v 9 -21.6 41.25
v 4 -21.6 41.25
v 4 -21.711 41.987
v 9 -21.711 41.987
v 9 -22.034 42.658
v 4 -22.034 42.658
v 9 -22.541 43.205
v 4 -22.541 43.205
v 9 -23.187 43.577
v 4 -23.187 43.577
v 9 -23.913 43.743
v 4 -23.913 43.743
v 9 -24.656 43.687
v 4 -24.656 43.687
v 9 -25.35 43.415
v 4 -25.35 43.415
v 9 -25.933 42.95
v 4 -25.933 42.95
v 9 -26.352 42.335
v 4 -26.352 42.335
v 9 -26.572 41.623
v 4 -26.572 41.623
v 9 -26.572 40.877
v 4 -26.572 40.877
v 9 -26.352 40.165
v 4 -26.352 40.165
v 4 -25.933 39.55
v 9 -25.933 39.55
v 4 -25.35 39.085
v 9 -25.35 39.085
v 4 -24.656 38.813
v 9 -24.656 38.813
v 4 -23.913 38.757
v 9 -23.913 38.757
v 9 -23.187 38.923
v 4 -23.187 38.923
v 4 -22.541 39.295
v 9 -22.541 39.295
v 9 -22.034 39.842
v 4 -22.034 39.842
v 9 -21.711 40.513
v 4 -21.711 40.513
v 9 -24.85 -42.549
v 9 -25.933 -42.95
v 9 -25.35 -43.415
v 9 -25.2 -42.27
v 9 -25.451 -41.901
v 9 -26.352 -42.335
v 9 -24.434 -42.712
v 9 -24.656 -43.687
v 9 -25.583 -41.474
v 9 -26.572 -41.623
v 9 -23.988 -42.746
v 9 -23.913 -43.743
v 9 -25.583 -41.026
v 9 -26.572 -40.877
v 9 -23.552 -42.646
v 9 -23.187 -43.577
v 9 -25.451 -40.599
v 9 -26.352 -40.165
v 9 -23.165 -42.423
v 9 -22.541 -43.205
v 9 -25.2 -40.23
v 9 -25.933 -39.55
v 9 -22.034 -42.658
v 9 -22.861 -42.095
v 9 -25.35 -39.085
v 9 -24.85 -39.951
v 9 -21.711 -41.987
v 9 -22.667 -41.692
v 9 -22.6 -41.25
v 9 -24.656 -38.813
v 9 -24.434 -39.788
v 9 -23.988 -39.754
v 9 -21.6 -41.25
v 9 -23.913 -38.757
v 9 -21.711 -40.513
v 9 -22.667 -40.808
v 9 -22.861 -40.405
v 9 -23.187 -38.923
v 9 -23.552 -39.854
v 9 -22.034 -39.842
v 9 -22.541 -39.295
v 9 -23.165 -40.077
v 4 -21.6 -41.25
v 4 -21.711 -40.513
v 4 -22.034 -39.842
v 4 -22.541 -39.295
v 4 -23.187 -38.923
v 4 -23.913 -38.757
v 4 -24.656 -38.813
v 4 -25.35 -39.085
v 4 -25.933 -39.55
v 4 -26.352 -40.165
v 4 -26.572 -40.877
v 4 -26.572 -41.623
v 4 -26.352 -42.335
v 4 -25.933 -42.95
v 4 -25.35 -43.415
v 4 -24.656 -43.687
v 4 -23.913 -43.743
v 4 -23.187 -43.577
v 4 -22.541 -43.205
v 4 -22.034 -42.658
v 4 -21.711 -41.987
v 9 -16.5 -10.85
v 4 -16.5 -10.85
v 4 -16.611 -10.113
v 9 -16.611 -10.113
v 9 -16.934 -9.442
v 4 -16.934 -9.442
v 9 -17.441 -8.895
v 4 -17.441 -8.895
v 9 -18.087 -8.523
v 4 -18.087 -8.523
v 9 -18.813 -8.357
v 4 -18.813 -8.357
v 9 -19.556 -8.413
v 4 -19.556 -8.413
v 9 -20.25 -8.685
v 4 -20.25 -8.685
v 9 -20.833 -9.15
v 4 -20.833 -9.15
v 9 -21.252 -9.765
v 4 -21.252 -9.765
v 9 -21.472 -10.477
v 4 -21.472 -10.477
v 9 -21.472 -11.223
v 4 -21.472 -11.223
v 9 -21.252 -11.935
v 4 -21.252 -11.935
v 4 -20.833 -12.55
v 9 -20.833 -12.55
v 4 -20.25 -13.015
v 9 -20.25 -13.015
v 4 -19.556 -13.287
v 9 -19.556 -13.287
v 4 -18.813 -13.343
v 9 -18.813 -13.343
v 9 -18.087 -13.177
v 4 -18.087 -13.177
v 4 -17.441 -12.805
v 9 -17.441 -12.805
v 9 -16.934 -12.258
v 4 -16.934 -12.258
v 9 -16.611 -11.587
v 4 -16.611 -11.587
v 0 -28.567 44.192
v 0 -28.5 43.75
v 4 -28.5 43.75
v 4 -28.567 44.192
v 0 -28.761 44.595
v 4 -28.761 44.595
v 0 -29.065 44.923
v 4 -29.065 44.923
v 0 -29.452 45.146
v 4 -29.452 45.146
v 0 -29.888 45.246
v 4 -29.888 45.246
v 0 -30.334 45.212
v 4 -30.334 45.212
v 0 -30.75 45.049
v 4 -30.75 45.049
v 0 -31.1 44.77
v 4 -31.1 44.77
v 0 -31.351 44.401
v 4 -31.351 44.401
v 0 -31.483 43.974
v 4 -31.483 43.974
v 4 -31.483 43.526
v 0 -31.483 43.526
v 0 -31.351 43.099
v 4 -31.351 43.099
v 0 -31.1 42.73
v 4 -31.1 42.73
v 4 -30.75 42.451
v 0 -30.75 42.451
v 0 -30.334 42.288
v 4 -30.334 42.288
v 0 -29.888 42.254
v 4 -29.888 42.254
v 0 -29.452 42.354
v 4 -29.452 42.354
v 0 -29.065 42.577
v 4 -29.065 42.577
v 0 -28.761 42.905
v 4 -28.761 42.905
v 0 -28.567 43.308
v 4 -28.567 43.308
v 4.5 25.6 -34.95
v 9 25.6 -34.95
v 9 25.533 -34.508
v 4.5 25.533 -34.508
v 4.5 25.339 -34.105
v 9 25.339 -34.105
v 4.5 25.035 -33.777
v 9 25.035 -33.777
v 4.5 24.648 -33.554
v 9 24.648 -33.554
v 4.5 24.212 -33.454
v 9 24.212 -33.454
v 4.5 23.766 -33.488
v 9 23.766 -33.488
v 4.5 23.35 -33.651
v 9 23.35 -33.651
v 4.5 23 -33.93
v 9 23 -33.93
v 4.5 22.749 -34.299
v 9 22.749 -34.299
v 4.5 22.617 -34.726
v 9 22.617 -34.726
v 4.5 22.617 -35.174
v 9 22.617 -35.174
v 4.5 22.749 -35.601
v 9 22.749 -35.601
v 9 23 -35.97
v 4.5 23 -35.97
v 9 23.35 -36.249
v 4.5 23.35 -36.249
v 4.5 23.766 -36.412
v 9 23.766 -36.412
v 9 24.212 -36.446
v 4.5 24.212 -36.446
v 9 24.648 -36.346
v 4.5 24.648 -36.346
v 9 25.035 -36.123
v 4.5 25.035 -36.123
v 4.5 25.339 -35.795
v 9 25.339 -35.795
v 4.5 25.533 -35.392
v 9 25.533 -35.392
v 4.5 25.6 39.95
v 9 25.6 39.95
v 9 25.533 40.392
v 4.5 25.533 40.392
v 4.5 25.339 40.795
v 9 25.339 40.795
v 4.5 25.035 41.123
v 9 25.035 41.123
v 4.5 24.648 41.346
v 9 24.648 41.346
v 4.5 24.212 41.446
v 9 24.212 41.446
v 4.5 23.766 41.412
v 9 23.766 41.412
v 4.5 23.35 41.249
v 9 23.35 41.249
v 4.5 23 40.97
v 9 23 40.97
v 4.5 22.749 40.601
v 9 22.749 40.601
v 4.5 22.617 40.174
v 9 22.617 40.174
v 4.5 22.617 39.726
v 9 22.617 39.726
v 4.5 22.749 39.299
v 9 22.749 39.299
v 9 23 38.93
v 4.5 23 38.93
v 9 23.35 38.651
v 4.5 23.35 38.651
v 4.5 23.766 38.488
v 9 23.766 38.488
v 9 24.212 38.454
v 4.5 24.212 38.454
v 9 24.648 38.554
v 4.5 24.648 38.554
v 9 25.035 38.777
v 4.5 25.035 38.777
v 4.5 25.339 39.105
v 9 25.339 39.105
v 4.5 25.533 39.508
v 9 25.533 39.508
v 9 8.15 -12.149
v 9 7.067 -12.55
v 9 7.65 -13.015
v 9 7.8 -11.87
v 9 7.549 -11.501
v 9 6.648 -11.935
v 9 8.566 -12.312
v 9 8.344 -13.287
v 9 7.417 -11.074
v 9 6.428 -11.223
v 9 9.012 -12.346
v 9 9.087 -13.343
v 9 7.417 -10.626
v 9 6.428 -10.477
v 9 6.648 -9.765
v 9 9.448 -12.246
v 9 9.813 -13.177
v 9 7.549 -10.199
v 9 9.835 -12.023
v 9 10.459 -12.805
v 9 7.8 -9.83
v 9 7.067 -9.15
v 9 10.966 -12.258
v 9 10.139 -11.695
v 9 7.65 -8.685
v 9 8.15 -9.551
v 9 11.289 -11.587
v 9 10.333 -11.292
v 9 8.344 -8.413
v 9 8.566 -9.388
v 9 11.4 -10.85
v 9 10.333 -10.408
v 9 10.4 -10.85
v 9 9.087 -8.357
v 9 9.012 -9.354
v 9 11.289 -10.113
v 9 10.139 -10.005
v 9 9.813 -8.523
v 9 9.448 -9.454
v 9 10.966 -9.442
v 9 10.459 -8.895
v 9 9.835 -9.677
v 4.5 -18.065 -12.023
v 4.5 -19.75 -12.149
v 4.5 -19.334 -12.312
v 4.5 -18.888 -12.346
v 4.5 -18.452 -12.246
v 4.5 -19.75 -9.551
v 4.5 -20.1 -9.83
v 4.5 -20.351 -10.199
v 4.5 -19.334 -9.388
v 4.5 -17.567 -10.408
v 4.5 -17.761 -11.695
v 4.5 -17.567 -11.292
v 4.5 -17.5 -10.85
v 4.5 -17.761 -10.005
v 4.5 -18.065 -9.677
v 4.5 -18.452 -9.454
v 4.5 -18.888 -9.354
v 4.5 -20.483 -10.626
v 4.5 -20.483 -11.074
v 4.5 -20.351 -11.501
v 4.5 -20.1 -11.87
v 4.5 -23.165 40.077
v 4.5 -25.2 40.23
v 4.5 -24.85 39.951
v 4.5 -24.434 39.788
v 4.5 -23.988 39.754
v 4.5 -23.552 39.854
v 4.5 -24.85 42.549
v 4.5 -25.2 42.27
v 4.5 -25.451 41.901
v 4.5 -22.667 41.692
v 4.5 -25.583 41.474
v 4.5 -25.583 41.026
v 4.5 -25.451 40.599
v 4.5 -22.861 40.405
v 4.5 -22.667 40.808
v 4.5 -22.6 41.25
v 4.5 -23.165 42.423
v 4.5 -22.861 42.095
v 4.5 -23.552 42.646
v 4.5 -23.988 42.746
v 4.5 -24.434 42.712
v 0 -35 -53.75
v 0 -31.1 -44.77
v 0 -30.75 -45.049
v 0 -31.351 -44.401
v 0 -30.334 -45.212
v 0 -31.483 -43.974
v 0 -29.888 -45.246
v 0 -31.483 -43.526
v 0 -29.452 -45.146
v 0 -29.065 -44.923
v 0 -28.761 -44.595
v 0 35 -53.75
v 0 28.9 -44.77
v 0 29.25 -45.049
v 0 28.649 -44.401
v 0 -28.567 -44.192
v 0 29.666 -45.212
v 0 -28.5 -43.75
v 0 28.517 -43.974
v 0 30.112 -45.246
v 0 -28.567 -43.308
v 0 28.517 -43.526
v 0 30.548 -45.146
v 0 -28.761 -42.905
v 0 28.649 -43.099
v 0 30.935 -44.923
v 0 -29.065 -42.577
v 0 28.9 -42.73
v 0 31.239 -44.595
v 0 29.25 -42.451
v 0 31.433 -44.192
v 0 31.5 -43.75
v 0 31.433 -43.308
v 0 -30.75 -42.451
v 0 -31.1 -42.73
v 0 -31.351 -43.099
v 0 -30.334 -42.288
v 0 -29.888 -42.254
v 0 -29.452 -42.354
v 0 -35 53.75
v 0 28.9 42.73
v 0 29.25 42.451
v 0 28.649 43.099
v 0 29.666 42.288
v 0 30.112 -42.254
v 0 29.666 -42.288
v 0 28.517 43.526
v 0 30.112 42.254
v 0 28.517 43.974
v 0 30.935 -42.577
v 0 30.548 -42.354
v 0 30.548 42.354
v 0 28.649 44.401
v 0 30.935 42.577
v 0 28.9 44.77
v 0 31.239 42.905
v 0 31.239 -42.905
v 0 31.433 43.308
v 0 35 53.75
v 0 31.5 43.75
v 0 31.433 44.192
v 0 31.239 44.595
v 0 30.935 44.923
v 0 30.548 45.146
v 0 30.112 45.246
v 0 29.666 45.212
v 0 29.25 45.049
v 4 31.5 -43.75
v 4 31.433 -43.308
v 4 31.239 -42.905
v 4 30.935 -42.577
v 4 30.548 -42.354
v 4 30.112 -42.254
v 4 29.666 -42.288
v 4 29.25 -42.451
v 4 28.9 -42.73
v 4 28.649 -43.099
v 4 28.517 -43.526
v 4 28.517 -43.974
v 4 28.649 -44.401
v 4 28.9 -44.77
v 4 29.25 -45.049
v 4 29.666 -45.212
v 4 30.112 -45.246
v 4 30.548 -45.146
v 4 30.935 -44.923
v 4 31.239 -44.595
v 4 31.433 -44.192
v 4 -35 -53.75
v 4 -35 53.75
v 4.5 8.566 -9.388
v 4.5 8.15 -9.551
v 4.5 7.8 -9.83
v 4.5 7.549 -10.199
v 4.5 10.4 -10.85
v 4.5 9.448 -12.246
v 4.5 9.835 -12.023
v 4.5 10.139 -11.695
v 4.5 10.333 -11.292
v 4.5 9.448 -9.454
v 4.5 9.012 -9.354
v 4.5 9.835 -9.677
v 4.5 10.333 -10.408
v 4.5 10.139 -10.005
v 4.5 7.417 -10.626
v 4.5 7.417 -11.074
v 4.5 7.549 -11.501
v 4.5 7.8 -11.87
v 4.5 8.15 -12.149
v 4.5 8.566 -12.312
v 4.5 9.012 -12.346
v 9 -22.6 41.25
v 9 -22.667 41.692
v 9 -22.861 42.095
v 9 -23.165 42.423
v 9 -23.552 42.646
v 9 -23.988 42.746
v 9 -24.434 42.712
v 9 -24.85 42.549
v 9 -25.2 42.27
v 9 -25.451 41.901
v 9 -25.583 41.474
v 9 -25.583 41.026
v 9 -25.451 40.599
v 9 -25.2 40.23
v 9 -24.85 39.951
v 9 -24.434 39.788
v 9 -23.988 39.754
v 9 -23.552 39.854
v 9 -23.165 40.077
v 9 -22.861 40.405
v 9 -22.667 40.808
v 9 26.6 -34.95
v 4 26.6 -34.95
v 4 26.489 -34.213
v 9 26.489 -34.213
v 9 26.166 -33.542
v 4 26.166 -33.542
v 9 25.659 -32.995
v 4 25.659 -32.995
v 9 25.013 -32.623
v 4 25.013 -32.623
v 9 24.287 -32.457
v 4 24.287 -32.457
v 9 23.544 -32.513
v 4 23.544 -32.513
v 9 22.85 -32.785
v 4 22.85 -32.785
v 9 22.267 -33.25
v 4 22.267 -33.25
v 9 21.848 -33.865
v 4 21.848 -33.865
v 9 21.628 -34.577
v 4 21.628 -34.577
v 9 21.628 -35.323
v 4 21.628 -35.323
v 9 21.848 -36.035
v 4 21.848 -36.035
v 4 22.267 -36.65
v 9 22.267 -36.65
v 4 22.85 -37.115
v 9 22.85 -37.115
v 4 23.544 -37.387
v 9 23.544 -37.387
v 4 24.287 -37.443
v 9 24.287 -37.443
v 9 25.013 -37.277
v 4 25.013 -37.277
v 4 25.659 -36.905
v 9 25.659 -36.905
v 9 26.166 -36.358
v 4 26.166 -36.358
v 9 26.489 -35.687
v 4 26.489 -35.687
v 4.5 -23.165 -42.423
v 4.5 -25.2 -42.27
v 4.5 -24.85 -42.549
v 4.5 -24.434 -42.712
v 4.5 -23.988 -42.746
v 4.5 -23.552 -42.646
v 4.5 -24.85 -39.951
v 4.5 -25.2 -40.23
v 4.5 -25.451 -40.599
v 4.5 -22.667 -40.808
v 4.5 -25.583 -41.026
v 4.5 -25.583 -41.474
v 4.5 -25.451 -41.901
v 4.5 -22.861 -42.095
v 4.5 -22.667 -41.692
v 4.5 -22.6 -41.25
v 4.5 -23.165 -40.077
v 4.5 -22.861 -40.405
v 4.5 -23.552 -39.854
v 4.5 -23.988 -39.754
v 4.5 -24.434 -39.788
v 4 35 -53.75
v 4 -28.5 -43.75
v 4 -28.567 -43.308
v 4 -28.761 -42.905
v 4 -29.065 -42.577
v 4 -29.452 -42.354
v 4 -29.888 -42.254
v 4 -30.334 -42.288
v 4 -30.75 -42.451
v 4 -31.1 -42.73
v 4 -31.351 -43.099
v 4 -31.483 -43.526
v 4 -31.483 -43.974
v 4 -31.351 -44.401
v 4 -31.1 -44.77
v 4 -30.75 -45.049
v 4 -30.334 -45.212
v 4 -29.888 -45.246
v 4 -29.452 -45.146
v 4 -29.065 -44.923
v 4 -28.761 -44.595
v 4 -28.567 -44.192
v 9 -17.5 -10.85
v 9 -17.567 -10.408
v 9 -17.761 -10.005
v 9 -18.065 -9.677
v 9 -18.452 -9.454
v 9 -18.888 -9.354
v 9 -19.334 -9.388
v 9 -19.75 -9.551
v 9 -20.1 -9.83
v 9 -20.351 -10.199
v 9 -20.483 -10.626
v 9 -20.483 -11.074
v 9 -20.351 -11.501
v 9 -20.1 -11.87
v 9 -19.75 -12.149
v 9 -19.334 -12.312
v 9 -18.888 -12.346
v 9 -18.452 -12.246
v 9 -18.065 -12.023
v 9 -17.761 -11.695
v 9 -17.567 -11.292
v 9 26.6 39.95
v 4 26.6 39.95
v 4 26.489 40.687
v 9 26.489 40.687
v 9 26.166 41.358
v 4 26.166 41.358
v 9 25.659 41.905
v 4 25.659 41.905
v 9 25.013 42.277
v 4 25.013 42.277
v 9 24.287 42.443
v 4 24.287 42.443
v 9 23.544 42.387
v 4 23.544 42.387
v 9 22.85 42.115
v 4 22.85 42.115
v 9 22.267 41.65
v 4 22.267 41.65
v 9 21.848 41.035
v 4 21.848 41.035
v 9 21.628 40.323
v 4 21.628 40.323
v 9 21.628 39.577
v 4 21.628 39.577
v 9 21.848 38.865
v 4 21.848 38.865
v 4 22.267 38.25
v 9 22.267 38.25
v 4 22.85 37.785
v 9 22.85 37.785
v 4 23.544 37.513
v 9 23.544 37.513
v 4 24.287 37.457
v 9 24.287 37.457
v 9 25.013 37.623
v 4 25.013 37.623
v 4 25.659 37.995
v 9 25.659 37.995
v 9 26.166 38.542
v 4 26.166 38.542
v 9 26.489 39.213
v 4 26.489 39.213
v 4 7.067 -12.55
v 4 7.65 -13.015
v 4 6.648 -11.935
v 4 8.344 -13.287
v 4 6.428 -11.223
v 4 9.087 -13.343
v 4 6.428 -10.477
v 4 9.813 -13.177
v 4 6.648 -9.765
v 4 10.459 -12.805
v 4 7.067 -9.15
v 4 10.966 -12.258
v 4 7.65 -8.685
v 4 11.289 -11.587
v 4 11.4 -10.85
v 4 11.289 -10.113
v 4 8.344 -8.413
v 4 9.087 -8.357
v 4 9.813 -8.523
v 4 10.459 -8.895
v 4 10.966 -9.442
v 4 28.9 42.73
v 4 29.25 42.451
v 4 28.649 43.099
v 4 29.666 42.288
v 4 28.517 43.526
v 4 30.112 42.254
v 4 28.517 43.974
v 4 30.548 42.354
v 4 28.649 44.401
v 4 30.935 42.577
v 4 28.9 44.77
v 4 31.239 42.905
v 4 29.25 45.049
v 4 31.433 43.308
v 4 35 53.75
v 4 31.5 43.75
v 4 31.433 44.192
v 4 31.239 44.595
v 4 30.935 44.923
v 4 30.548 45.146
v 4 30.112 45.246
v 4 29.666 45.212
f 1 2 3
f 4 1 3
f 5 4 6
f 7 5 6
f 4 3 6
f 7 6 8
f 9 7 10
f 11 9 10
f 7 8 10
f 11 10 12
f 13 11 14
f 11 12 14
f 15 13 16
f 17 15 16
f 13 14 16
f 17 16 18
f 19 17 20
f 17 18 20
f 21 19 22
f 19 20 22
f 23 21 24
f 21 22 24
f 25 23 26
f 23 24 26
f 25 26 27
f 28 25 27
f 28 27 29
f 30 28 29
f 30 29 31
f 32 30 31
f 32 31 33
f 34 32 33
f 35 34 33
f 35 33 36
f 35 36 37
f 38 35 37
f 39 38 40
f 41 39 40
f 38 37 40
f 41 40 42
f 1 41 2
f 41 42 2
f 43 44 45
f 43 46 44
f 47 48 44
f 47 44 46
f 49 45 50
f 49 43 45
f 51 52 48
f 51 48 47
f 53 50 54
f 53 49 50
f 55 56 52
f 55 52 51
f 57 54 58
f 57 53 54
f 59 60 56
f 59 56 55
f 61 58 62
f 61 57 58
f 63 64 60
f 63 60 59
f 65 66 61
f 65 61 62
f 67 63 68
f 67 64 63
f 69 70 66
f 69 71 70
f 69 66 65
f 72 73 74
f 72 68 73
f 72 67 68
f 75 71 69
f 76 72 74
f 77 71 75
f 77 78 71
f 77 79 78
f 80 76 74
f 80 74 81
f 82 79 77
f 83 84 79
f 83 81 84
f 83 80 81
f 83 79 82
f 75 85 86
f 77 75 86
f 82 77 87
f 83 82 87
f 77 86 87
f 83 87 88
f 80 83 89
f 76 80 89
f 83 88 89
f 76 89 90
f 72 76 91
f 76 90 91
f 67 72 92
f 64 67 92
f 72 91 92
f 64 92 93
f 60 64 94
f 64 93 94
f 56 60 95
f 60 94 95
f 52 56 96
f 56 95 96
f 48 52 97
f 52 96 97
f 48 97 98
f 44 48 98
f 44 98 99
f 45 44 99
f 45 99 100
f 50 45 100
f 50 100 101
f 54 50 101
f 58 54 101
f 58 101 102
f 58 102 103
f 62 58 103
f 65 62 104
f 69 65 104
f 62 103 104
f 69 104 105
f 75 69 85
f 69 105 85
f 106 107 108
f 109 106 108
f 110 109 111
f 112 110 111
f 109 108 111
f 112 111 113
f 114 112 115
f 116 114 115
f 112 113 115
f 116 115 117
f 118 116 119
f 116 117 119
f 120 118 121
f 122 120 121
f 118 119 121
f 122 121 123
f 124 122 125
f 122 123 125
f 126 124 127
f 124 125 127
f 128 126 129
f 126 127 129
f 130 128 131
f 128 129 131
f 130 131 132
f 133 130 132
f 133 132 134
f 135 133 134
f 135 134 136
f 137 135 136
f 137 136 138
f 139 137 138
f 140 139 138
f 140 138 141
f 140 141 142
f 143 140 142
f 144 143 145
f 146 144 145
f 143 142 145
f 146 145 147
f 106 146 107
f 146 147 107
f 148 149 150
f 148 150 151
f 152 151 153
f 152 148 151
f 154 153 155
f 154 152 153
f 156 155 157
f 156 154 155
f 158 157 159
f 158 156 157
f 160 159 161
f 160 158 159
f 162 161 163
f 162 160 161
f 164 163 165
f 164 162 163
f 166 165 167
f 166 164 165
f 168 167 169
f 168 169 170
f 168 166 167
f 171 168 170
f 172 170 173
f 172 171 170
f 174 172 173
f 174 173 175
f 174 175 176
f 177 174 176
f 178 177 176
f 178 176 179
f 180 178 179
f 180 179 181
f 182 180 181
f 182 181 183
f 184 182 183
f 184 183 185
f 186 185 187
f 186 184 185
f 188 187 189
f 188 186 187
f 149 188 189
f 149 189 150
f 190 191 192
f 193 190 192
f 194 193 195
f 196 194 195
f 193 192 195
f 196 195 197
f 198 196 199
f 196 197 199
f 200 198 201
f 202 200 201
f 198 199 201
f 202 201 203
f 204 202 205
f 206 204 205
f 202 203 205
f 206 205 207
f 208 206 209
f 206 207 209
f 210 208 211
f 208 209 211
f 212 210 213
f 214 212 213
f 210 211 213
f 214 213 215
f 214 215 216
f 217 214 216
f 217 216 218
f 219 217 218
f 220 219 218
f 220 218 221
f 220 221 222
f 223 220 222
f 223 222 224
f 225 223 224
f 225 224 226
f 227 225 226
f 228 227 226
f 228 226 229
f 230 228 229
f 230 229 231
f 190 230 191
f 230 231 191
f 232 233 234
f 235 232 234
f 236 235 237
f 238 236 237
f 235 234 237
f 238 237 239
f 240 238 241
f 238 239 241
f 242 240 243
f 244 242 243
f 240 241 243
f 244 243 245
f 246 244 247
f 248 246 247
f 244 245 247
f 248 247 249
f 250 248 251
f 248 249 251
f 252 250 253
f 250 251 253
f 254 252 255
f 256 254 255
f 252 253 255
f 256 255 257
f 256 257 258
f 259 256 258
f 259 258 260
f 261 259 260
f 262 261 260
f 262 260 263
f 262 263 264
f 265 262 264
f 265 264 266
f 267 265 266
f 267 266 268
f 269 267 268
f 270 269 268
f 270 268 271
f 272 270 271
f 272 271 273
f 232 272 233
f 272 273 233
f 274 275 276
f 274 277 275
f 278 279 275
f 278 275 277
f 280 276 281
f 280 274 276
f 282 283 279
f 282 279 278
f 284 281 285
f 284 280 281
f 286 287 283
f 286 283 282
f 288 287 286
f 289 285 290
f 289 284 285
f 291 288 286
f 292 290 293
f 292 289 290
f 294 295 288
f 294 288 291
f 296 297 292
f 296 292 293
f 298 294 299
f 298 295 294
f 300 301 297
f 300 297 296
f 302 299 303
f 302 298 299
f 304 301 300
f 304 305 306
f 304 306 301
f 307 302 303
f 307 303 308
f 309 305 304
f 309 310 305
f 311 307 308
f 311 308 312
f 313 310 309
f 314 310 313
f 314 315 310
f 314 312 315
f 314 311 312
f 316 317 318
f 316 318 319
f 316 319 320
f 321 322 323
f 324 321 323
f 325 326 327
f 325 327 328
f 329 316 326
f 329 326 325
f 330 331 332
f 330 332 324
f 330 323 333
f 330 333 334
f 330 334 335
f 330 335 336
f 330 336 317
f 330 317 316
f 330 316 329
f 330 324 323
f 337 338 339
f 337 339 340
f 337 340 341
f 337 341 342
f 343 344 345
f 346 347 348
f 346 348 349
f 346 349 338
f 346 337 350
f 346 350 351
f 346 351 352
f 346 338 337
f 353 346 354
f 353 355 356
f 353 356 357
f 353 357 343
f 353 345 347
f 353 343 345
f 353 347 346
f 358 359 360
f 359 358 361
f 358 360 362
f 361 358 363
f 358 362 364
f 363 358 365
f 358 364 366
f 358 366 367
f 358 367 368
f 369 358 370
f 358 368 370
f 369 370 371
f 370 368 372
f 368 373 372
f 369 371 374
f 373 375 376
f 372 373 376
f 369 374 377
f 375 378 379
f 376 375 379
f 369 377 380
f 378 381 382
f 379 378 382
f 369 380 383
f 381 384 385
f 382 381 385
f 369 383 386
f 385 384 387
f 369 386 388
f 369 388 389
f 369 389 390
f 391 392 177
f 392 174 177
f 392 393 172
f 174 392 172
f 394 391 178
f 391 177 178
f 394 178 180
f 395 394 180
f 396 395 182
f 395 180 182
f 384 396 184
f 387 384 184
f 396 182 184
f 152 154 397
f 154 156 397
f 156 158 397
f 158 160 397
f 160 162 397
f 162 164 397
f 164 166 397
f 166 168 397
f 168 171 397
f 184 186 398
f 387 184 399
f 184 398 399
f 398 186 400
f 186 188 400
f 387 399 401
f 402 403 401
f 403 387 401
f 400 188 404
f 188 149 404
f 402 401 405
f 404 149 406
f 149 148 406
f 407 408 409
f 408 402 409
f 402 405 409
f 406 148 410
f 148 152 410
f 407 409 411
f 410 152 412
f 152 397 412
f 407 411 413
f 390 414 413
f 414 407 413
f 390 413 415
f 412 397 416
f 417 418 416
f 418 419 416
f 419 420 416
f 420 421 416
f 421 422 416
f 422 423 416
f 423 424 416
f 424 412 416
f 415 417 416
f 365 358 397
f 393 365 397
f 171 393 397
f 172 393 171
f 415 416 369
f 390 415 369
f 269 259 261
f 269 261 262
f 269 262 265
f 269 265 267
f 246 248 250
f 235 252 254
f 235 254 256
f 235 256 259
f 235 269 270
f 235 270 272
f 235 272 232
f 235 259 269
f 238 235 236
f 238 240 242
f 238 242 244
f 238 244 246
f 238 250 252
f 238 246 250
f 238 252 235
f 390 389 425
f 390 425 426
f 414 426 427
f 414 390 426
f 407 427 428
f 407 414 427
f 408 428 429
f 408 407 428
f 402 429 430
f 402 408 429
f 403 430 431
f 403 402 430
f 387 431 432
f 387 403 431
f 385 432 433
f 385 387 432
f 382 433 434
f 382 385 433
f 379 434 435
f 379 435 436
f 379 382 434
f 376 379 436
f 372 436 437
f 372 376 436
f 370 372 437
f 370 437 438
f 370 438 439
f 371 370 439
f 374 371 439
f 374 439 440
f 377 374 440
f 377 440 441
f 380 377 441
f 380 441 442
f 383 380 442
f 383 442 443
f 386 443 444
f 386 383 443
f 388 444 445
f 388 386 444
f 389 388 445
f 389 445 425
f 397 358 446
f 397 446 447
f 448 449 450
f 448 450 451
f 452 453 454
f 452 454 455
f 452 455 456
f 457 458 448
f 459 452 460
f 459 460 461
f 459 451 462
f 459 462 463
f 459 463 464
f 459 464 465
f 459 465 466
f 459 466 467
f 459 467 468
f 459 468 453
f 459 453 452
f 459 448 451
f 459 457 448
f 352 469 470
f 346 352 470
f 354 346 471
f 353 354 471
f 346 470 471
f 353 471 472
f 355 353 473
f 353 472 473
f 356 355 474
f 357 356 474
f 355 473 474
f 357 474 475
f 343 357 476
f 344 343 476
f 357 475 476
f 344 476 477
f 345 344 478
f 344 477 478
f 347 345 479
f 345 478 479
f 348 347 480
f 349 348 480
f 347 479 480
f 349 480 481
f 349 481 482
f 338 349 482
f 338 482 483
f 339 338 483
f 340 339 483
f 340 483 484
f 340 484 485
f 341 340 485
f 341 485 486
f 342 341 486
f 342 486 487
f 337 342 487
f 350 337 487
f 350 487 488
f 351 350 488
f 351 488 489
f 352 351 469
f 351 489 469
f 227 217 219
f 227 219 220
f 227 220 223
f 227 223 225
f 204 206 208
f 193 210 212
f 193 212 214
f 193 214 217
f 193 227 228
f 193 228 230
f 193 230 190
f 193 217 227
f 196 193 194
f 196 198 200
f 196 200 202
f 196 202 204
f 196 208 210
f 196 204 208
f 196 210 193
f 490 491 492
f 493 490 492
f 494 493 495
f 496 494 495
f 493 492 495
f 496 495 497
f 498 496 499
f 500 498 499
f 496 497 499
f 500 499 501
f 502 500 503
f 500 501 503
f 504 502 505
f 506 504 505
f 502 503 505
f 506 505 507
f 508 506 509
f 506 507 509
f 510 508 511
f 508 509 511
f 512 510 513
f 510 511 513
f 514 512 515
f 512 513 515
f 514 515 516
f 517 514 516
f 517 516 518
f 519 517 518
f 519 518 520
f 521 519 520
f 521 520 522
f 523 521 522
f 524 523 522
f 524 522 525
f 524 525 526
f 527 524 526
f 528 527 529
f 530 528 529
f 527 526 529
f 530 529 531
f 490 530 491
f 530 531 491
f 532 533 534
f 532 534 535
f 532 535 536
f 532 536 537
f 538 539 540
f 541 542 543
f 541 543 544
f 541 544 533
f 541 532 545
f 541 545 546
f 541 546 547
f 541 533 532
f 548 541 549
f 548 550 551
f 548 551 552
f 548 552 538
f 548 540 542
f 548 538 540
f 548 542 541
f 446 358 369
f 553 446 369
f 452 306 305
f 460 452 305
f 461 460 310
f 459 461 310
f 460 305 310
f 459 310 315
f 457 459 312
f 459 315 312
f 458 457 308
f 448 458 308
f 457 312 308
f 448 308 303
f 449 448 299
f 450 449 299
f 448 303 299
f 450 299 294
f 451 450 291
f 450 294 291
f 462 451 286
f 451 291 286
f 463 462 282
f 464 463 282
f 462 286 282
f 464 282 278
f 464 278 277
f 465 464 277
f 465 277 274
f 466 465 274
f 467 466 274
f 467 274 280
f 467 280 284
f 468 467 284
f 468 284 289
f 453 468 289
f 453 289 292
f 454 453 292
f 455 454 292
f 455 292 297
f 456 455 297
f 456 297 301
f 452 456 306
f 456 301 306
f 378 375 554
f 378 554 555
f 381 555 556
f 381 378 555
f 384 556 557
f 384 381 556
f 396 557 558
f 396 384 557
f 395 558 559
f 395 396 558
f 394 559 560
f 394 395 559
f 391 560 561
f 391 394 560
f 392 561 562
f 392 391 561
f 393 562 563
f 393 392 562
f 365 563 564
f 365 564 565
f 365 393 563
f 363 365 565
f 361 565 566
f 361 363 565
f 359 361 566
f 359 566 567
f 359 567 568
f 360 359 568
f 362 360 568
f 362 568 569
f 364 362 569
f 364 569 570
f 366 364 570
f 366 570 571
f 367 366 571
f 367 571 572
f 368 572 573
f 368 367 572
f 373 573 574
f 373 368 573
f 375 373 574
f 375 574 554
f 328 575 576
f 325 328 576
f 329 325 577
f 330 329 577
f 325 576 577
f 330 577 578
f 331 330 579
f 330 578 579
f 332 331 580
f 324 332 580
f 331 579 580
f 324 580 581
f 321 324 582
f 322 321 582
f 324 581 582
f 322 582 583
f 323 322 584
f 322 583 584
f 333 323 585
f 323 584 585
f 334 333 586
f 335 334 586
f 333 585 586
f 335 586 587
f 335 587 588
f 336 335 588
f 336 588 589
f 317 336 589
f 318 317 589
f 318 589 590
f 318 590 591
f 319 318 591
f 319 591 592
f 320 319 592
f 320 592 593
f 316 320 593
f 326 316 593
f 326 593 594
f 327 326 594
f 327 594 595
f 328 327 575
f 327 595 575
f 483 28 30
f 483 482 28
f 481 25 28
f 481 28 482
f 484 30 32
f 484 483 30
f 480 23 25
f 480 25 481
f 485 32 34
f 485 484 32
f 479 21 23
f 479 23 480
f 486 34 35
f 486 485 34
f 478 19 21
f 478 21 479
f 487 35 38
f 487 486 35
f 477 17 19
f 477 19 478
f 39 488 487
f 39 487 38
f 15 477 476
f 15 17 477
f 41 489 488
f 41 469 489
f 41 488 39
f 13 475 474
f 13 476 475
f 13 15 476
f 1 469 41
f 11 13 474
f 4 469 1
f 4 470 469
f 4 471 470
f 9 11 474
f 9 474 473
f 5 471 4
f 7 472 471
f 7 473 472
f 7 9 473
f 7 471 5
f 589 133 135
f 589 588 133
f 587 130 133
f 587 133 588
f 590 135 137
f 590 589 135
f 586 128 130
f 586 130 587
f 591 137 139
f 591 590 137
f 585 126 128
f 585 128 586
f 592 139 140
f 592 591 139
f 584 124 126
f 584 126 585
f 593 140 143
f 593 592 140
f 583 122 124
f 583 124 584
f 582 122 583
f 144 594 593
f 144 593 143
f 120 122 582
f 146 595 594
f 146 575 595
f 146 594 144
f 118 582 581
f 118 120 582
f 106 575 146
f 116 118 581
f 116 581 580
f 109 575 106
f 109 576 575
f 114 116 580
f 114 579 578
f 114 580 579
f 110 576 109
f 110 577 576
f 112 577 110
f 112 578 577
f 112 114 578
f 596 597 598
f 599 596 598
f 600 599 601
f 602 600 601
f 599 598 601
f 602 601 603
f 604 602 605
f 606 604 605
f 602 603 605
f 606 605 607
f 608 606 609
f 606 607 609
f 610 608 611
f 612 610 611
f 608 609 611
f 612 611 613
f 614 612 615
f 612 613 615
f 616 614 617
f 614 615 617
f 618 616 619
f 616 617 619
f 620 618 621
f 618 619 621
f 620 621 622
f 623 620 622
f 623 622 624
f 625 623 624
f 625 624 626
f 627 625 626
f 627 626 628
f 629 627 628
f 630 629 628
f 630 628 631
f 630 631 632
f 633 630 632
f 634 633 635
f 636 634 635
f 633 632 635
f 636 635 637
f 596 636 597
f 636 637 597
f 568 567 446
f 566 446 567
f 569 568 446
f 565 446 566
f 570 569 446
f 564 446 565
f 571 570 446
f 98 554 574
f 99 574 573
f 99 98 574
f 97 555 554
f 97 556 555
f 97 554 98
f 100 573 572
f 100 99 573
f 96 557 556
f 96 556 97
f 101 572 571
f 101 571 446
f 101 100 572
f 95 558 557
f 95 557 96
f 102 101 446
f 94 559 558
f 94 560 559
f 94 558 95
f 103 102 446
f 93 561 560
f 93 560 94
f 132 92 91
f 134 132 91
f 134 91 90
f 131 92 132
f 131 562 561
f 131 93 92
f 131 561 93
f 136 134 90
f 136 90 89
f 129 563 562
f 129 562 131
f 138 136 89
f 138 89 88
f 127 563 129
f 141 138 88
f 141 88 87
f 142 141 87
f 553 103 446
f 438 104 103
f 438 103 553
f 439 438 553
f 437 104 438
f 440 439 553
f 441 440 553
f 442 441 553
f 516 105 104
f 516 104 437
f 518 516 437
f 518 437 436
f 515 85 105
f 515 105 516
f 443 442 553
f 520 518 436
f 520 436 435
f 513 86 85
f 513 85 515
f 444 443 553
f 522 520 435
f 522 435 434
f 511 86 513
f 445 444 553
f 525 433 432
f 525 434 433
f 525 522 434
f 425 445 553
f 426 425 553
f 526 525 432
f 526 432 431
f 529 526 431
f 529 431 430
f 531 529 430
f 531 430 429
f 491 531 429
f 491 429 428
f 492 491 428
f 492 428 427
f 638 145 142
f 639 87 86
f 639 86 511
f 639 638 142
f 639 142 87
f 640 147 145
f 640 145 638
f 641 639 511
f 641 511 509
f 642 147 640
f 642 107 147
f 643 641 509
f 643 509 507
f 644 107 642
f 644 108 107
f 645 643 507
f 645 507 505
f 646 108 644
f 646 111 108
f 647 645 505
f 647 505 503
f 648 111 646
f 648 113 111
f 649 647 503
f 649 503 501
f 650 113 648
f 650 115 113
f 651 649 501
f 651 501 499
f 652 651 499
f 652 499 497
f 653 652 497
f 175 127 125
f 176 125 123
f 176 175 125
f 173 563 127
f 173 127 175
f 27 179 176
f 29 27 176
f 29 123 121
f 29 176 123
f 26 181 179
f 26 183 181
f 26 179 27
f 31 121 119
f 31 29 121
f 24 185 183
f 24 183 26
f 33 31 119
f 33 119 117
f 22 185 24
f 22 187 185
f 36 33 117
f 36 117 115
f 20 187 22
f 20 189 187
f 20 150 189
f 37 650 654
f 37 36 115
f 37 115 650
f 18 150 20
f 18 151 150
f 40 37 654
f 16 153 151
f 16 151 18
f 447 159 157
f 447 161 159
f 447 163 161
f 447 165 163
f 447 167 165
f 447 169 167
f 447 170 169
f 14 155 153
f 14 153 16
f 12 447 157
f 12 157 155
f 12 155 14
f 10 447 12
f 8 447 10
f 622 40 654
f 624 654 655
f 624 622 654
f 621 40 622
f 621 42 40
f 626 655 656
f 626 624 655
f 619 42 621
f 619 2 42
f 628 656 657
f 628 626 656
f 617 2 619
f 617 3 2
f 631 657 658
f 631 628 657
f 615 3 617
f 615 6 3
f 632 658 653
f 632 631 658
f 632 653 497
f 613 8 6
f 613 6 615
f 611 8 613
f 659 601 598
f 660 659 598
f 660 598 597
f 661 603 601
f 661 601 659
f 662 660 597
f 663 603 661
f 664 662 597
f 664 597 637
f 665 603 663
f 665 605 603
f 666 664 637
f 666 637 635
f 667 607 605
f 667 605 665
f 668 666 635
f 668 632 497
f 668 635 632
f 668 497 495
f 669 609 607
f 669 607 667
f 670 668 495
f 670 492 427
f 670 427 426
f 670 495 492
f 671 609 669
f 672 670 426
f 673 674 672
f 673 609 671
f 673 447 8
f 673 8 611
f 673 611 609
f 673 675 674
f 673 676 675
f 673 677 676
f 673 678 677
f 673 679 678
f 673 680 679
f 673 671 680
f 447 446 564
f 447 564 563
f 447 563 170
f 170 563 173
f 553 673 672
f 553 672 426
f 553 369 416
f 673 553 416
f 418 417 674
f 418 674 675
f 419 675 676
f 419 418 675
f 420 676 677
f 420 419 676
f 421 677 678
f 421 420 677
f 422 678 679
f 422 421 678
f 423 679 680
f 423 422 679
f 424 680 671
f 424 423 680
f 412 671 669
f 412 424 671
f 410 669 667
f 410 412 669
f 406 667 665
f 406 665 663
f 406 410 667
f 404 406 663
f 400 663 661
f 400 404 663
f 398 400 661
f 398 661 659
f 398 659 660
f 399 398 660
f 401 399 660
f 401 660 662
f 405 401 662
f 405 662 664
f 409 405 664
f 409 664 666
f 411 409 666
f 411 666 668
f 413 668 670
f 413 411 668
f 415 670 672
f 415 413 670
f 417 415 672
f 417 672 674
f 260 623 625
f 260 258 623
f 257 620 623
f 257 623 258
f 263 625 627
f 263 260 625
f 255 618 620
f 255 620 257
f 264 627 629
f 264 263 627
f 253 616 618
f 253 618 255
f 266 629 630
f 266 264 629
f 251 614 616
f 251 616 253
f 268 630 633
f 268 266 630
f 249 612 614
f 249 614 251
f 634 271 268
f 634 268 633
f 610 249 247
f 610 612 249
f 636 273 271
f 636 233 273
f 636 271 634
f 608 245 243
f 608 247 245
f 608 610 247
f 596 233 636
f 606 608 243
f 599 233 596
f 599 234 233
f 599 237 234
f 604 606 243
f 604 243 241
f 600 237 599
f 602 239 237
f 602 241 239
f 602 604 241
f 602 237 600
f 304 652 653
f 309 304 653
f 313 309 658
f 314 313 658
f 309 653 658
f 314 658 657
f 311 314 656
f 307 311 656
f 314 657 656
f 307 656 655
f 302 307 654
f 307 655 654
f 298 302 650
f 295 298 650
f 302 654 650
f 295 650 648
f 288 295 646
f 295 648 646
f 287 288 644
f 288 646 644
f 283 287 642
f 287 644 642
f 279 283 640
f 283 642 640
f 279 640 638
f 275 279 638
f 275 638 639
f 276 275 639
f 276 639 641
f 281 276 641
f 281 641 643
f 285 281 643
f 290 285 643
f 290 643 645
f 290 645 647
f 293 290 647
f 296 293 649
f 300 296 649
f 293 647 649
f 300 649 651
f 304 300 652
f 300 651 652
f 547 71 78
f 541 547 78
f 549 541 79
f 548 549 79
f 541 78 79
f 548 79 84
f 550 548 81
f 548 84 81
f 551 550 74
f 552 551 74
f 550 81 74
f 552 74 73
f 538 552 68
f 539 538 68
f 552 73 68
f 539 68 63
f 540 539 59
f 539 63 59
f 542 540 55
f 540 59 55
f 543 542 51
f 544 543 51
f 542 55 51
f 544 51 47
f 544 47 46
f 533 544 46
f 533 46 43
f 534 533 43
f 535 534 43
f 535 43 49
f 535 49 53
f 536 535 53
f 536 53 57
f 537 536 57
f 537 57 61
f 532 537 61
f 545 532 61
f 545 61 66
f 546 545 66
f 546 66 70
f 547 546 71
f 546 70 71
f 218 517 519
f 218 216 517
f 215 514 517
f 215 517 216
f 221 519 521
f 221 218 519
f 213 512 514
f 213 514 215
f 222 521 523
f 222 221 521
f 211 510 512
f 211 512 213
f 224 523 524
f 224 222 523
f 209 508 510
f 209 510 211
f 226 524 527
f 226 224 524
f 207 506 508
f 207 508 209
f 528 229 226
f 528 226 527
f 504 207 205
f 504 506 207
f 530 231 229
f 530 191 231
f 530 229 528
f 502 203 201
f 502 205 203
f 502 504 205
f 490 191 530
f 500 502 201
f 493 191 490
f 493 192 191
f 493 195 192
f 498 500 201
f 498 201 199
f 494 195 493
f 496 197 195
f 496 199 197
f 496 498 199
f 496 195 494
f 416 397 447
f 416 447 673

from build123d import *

# Parameters (mm, degrees)
SKETCH010_W     = 70
SKETCH010_H     = 107.5
SKETCH010_R     = 1.5
PAD004_DEPTH    = 4
SKETCH011_R     = 2.5
PAD005_DEPTH    = 5
SKETCH012_R     = 1.5
POCKET001_DEPTH = 4.5


with BuildPart() as part:
    # Sketch010 → Pad004 (new body)
    with BuildSketch(Plane.YZ):
        Rectangle(SKETCH010_W, SKETCH010_H)
        with Locations((-30, 43.75)):
            Circle(SKETCH010_R, mode=Mode.SUBTRACT)
        with Locations((30, 43.75)):
            Circle(SKETCH010_R, mode=Mode.SUBTRACT)
        with Locations((-30, -43.75)):
            Circle(SKETCH010_R, mode=Mode.SUBTRACT)
        with Locations((30, -43.75)):
            Circle(SKETCH010_R, mode=Mode.SUBTRACT)
    extrude(amount=PAD004_DEPTH)

    # Sketch011 (on Face10 of Pad004) → Pad005 (join)
    with BuildSketch(Plane.YZ.offset(4)):
        with Locations((-24.1, 41.25)):
            Circle(SKETCH011_R)
        with Locations((24.1, 39.95)):
            Circle(SKETCH011_R)
        with Locations((-19, -10.85)):
            Circle(SKETCH011_R)
        with Locations((8.9, -10.85)):
            Circle(SKETCH011_R)
        with Locations((24.1, -34.95)):
            Circle(SKETCH011_R)
        with Locations((-24.1, -41.25)):
            Circle(SKETCH011_R)
    extrude(amount=PAD005_DEPTH)

    # Sketch012 (on Face20 of Pad005) → Pocket001 (cut)
    with BuildSketch(Plane.YZ.offset(9)):
        with Locations((-24.1, 41.25)):
            Circle(SKETCH012_R)
        with Locations((24.1, 39.95)):
            Circle(SKETCH012_R)
        with Locations((-19, -10.85)):
            Circle(SKETCH012_R)
        with Locations((8.9, -10.85)):
            Circle(SKETCH012_R)
        with Locations((24.1, -34.95)):
            Circle(SKETCH012_R)
        with Locations((-24.1, -41.25)):
            Circle(SKETCH012_R)
    extrude(amount=-POCKET001_DEPTH, mode=Mode.SUBTRACT)


solid = part.part
